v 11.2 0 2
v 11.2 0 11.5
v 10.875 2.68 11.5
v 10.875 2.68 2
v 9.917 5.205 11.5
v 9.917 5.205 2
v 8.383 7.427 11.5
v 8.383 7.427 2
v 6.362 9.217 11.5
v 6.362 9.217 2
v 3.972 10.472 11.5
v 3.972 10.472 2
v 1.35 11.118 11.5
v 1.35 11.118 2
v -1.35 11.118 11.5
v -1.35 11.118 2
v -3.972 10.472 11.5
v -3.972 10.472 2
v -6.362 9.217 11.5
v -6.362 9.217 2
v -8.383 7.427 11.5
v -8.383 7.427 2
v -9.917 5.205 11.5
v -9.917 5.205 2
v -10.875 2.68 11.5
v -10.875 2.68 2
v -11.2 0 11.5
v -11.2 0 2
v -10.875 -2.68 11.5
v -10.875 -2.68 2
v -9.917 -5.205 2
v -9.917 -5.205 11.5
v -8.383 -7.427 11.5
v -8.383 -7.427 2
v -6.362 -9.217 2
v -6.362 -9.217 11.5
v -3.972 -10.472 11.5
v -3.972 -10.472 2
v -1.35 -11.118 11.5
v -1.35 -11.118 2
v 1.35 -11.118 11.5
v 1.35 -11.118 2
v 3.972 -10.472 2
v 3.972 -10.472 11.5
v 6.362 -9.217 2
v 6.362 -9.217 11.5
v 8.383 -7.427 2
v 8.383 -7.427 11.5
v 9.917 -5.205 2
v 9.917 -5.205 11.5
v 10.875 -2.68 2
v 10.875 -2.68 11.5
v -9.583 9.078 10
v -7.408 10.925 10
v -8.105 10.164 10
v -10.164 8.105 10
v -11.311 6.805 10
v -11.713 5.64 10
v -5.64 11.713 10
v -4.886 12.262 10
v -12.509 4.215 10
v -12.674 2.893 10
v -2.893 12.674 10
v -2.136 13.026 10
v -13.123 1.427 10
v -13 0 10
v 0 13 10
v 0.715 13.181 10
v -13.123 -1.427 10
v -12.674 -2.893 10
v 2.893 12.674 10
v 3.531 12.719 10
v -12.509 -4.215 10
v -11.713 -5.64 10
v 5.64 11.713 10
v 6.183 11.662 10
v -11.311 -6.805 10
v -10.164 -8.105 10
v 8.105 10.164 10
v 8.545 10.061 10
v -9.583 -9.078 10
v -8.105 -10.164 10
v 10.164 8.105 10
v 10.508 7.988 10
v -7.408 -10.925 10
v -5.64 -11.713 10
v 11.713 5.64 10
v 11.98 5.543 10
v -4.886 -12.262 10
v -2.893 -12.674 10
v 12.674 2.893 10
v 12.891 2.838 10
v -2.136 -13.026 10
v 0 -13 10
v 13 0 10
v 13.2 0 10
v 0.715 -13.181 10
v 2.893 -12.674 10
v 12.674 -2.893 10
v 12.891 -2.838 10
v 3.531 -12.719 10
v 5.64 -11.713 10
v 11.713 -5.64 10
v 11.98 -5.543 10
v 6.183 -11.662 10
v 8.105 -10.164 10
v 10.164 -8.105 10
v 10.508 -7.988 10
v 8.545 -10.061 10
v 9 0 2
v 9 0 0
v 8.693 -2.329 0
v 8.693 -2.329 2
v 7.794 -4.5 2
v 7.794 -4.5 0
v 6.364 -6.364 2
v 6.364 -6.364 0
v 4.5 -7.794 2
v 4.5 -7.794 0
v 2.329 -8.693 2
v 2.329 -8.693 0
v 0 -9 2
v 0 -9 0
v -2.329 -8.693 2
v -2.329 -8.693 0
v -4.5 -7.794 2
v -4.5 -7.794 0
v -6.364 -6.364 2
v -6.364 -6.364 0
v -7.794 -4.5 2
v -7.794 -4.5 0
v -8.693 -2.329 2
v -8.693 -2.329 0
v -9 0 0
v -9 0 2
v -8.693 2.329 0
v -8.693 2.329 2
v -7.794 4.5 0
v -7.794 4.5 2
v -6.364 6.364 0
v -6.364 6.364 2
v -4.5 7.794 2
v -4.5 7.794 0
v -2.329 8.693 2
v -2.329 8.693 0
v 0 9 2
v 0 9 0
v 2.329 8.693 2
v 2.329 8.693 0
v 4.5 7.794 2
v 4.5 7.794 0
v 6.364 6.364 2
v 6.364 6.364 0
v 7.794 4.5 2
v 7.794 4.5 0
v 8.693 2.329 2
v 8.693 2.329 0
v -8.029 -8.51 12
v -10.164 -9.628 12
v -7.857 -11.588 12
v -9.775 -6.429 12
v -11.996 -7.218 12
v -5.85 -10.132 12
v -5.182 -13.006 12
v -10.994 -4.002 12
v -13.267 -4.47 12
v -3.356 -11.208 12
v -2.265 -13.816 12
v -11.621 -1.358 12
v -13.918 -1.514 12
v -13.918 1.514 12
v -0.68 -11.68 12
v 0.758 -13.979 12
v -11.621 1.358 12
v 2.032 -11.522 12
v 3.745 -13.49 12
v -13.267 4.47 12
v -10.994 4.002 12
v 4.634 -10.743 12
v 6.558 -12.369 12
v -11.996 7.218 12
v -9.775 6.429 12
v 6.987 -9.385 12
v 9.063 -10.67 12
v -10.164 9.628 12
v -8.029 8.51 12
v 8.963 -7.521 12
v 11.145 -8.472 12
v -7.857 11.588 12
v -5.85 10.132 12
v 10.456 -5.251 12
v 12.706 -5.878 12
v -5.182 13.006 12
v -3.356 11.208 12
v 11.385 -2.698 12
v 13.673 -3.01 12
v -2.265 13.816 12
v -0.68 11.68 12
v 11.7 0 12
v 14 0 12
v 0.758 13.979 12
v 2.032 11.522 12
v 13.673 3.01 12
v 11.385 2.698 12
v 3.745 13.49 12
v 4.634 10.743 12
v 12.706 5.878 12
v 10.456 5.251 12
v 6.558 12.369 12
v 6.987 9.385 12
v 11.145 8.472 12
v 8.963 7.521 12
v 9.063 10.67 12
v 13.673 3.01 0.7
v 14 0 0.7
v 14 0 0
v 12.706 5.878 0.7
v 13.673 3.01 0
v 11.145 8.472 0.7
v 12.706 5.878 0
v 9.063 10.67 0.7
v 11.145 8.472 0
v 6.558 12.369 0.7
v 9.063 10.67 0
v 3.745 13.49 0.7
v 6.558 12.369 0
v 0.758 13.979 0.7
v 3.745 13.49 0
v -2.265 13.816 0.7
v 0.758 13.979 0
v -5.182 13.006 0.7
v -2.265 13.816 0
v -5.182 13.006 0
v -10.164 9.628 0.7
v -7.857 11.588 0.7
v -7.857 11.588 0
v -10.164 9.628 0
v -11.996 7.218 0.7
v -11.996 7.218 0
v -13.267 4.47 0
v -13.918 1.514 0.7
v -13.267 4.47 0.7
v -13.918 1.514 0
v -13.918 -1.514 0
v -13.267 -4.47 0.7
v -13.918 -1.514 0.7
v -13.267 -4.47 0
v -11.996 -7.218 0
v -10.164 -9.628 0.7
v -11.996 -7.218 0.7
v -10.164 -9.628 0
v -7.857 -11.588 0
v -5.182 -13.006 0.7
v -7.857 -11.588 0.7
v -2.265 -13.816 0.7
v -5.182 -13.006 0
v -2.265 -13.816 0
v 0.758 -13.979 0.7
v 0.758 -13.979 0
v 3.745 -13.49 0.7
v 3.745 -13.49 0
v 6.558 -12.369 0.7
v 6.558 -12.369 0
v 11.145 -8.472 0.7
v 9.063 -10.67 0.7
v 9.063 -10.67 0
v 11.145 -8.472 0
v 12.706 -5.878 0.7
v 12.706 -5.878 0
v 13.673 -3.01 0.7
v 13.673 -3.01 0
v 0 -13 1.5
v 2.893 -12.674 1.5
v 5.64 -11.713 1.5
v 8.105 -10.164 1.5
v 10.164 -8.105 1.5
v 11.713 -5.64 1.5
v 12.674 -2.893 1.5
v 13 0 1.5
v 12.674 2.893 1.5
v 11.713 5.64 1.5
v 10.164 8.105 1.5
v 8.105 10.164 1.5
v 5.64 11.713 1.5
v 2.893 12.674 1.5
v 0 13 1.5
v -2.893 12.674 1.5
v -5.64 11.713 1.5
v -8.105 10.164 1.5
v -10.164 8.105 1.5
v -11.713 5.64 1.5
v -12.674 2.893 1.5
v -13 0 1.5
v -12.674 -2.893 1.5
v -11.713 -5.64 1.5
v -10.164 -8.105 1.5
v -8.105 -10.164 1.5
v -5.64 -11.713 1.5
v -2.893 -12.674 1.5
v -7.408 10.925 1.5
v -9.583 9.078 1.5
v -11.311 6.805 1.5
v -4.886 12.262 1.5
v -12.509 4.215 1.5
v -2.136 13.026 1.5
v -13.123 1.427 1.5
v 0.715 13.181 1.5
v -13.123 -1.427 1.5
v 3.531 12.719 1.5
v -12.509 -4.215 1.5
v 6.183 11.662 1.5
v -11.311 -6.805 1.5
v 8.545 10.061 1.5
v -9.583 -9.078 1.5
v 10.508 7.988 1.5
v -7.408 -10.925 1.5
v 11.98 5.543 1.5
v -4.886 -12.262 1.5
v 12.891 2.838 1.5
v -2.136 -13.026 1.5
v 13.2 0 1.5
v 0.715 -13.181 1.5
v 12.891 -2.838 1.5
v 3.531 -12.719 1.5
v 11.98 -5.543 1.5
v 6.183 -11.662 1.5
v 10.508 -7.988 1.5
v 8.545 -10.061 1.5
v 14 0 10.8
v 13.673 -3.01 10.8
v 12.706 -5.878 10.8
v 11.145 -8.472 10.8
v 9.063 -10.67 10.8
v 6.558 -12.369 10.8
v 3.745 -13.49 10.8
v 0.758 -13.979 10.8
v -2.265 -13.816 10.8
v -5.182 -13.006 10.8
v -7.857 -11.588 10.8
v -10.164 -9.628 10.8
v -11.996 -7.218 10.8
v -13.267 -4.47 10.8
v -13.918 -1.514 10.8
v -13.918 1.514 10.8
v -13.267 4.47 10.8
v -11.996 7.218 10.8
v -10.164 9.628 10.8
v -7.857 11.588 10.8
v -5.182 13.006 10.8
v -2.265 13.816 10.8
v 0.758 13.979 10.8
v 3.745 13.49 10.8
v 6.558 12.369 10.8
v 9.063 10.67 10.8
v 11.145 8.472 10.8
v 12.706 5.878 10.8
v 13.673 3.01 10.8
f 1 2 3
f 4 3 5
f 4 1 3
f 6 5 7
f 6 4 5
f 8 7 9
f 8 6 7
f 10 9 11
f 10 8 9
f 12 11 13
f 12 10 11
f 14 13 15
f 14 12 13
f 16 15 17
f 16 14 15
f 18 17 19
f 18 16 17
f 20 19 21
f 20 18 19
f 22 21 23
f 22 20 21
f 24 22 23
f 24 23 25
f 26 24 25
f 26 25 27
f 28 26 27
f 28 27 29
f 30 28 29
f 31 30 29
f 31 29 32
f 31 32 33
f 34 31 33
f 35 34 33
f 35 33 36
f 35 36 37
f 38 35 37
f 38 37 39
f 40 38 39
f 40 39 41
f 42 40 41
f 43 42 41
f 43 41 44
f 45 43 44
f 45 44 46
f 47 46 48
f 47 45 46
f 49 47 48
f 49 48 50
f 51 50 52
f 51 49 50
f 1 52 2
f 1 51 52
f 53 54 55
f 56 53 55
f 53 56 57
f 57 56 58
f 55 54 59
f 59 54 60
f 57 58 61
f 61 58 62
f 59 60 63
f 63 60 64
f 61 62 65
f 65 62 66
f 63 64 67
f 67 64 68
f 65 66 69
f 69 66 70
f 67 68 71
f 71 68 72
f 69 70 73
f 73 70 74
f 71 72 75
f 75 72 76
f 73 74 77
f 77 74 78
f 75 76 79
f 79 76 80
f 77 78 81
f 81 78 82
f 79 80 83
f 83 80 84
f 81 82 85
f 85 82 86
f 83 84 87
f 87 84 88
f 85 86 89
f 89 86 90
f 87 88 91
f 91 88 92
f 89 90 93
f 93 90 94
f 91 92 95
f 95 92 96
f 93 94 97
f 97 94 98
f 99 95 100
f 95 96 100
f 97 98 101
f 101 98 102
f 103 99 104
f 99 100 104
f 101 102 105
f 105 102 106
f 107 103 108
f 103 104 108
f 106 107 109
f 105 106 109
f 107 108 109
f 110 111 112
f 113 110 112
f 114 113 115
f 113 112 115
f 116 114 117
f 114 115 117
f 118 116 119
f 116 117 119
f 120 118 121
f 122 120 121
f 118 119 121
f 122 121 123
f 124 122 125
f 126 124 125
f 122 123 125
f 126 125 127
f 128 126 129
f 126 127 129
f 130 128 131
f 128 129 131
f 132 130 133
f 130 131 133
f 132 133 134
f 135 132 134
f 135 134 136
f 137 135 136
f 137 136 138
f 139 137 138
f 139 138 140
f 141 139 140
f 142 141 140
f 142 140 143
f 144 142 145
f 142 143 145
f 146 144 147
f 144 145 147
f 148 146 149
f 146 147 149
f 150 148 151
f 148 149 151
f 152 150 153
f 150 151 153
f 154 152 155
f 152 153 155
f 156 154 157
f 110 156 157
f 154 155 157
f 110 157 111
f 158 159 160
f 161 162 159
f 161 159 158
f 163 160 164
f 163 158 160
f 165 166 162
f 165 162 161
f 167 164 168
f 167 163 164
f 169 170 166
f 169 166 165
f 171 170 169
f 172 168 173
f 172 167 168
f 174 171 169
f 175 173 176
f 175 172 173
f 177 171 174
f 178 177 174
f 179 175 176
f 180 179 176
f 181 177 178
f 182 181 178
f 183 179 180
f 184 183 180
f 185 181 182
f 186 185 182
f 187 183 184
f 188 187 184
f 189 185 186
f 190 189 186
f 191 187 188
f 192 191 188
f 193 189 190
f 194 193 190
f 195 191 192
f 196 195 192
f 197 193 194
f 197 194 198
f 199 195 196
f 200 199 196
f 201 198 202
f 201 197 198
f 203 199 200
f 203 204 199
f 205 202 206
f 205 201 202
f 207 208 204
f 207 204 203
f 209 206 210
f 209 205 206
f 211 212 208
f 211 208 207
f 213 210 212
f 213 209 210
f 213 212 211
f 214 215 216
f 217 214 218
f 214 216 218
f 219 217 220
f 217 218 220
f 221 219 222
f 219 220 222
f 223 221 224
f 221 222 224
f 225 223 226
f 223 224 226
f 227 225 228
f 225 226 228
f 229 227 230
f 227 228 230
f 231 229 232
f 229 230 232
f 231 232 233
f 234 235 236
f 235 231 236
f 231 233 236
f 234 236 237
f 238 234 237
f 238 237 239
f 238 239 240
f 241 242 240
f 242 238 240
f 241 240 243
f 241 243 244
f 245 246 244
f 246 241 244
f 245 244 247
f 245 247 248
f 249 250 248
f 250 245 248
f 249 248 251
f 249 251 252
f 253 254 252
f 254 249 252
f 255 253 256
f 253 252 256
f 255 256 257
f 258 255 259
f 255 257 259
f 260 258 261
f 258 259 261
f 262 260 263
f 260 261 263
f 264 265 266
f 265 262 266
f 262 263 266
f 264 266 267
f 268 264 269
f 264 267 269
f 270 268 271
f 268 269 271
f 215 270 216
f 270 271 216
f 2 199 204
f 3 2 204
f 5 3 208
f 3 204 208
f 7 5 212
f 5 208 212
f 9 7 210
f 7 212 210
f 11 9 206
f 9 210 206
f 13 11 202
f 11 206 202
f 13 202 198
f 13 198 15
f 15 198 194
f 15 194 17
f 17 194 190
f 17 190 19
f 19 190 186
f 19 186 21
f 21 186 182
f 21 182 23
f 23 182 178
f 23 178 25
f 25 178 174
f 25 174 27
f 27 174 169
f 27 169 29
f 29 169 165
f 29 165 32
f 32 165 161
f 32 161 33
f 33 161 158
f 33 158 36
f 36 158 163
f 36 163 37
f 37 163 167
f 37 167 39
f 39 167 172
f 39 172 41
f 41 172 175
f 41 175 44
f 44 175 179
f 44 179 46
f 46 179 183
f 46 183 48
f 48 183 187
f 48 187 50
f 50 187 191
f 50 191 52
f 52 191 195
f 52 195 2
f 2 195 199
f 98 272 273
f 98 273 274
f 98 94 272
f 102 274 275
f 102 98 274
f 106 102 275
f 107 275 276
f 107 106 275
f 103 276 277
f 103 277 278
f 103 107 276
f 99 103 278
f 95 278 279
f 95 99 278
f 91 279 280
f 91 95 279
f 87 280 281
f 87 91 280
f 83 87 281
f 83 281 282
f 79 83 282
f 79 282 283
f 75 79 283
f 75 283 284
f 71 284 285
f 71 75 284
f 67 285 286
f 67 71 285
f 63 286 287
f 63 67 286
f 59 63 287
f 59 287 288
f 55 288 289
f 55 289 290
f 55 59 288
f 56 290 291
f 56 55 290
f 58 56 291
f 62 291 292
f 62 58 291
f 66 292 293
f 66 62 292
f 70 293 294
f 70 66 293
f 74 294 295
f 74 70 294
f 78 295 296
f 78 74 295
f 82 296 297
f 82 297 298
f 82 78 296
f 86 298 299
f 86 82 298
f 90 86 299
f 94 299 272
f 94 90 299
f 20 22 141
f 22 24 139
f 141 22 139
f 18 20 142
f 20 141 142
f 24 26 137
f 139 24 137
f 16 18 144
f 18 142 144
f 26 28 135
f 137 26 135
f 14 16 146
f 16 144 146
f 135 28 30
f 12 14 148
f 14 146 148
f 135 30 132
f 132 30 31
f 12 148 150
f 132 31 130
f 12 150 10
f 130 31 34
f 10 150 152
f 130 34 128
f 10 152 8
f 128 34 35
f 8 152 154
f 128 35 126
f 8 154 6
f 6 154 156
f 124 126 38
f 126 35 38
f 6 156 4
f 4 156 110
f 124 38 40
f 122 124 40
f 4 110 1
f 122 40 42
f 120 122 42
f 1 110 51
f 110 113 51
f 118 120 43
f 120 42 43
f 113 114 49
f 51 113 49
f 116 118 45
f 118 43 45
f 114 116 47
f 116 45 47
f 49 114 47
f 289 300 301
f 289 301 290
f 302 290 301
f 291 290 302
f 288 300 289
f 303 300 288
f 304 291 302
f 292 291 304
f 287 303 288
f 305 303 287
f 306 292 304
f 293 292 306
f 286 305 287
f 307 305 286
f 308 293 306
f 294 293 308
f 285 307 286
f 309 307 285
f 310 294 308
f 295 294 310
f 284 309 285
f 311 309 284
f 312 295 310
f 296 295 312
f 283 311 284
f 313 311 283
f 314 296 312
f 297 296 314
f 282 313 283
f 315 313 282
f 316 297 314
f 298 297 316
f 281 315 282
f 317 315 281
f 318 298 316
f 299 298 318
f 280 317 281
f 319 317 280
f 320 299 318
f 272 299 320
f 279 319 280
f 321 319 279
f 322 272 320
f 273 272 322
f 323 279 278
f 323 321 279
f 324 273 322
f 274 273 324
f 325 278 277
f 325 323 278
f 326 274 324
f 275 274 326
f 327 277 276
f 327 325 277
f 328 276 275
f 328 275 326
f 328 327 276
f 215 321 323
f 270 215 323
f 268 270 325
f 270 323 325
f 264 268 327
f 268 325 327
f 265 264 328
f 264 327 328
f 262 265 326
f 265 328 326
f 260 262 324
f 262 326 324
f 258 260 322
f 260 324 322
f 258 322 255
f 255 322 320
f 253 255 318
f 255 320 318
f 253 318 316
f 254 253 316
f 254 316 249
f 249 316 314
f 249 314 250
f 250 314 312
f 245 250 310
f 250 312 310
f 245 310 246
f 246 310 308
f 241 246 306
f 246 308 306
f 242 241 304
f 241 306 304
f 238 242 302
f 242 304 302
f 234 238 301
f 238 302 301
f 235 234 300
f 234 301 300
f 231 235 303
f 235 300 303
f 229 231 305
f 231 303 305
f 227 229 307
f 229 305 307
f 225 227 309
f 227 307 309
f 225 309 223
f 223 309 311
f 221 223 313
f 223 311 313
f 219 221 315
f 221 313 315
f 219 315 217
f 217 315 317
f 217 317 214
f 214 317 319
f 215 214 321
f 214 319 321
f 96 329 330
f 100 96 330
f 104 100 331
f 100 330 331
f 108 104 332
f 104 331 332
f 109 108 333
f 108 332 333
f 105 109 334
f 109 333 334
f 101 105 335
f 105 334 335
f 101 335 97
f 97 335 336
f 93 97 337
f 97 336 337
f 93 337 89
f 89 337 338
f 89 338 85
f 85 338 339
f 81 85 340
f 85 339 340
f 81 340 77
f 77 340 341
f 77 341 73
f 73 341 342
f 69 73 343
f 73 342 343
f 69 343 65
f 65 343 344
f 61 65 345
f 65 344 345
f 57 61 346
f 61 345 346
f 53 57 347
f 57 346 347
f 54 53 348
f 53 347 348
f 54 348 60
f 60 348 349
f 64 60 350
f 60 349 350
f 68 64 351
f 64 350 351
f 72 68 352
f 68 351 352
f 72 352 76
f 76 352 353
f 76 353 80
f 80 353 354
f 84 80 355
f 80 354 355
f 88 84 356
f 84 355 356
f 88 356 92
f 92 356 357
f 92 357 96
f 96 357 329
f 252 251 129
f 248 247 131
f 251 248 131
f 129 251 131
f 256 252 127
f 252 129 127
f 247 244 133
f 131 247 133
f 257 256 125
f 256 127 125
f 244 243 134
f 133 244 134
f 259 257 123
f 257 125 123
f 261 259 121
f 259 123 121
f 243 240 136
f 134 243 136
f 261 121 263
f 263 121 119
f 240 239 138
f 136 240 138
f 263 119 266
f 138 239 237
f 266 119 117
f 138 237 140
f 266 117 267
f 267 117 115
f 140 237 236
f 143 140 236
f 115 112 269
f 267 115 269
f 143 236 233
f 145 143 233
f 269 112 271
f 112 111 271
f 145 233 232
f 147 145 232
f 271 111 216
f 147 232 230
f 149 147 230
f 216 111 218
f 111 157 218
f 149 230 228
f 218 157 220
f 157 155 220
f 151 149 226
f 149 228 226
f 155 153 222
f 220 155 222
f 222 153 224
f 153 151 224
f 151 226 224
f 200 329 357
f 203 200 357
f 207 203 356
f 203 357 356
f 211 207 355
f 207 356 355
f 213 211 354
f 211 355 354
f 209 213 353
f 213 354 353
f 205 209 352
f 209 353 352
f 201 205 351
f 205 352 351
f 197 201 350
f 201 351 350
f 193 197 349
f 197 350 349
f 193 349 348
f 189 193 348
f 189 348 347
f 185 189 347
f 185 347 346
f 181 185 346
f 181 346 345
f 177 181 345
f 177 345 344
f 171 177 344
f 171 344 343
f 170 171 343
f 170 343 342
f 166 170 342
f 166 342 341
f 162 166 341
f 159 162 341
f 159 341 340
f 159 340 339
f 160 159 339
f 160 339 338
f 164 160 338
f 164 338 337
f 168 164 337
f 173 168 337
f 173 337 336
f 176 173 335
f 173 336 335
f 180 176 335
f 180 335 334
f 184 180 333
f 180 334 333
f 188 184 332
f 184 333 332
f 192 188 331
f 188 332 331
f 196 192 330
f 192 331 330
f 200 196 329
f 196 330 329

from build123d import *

# Parameters (mm, degrees)
TUBE_R          = 14
TUBE_R_2        = 11.2
TUBE_DEPTH      = 12
SKETCH001_W     = 4
SKETCH001_H     = 8.5
CHAMFER_SIZE    = 0.8
SKETCH_R        = 12.145698
SKETCH_R_2      = 9
PAD_DEPTH       = 2
CHAMFER001_SIZE = 0.5


with BuildPart() as part:
    # Tube → Tube (new body)
    with BuildSketch(Plane.XY):
        Circle(TUBE_R)
        Circle(TUBE_R_2, mode=Mode.SUBTRACT)
    extrude(amount=TUBE_DEPTH)

    # Sketch001 → Groove (revolve, cut)
    with BuildSketch(Plane.YZ):
        with Locations((-15, 5.75)):
            Rectangle(SKETCH001_W, SKETCH001_H)
    revolve(axis=Axis((0, 0, 0), (0, 0, 1)), mode=Mode.SUBTRACT)

    # Chamfer
    chamfer_edges = [part.edges().sort_by_distance(p)[0] for p in [
        (-14, 0, 10),
        (-14, 0, 1.5),
    ]]
    chamfer(chamfer_edges, length=CHAMFER_SIZE)

    # Sketch (on Face7 of Chamfer) → Pad (new body)
    with BuildSketch(Plane(origin=(0, 0, 0), x_dir=(1, 0, 0), z_dir=(0, 0, -1))):
        Circle(SKETCH_R)
        Circle(SKETCH_R_2, mode=Mode.SUBTRACT)
    extrude(amount=-PAD_DEPTH)

    # Chamfer001
    chamfer001_edges = [part.edges().sort_by_distance(p)[0] for p in [
        (-11.2, 0, 12),
    ]]
    chamfer(chamfer001_edges, length=CHAMFER001_SIZE)


solid = part.part
